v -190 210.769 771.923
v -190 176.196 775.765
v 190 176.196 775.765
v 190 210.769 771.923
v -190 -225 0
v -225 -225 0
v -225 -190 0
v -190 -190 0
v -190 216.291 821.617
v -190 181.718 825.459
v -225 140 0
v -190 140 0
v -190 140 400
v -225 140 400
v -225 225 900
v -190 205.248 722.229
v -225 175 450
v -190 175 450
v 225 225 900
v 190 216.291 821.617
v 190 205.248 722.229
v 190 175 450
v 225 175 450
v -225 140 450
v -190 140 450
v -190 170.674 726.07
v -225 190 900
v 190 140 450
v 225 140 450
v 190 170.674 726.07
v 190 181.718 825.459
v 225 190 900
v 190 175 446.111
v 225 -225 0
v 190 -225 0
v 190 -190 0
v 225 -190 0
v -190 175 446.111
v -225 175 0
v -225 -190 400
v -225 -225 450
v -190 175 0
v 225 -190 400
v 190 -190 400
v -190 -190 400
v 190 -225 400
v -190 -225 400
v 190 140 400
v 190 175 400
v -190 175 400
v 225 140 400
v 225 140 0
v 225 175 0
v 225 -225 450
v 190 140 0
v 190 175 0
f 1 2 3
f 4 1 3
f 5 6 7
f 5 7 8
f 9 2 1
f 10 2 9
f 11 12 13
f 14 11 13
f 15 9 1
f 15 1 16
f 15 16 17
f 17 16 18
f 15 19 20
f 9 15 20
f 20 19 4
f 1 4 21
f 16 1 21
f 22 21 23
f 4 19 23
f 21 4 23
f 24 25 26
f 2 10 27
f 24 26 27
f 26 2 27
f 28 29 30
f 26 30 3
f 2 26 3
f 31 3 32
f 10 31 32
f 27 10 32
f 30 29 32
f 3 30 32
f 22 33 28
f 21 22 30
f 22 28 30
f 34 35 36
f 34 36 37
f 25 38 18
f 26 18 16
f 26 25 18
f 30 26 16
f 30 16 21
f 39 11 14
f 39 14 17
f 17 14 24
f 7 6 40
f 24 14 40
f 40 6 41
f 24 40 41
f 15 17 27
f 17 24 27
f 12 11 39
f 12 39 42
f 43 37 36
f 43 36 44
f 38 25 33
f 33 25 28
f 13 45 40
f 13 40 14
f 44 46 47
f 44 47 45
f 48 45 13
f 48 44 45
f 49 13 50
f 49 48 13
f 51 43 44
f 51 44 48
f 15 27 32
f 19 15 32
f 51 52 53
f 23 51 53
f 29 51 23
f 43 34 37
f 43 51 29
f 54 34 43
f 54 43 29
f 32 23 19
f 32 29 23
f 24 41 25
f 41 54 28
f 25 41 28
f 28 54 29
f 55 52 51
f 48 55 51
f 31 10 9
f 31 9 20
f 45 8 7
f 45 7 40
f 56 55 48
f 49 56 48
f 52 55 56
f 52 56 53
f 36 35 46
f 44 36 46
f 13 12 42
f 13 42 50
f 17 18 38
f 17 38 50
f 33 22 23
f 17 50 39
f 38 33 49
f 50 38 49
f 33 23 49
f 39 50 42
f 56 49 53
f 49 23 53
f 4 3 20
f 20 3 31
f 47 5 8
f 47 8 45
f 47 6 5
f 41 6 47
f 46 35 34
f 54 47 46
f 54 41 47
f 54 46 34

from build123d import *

# Parameters (mm, degrees)
F0_W     = 450
F0_H     = 900
F1_DEPTH = 225
F2_W     = 50
F2_H     = 50
F2_H_2   = 400
F2_W_2   = 330
F3_DEPTH = 450.001
F4_W     = 380
F4_H     = 400
F5_DEPTH = 450.001
F6_W     = 380
F6_H     = 277.7692569069
F6_H_2   = 50
F7_DEPTH = 134.1753041809


# Not quite as in the source:
# - a feature names something its author has since deleted; it is built from what else it names


with BuildPart() as f1:
    # F0 (on Front) → F1 (new body, symmetric)
    with BuildSketch(Plane.XZ):
        with Locations((0, 450)):
            Rectangle(F0_W, F0_H)
    extrude(amount=F1_DEPTH, both=True)

    # F2 (on face) → F3 (cut, through all)
    with BuildSketch(Plane.YZ.offset(225)):
        Polygon((-225, 450), (140, 450), (190, 900), (-225, 900), align=None)
        Polygon((175, 450), (225, 450), (225, 900), align=None)
        with Locations((200, 425)):
            Rectangle(F2_W, F2_H)
        with Locations((200, 200)):
            Rectangle(F2_W, F2_H_2)
        with Locations((-25, 200)):
            Rectangle(F2_W_2, F2_H_2)
    extrude(amount=-F3_DEPTH, mode=Mode.SUBTRACT)

    # F4 (on face) → F5 (cut, through all)
    with BuildSketch(Plane.XZ.offset(225)):
        with Locations((0, 200)):
            Rectangle(F4_W, F4_H)
    extrude(amount=-F5_DEPTH, mode=Mode.SUBTRACT)

    # F6 (on face) → F7 (cut, through all)
    with BuildSketch(Plane(origin=(0, 88.9024390244, -9.8780487805), x_dir=(1, 0, 0), z_dir=(0, -0.9938837347, 0.1104315261))):
        with Locations((0, 601.592722707)):
            Rectangle(F6_W, F6_H)
        with Locations((0, 815.4773511605)):
            Rectangle(F6_W, F6_H_2)
    extrude(amount=-F7_DEPTH, mode=Mode.SUBTRACT)


solid = f1.part
